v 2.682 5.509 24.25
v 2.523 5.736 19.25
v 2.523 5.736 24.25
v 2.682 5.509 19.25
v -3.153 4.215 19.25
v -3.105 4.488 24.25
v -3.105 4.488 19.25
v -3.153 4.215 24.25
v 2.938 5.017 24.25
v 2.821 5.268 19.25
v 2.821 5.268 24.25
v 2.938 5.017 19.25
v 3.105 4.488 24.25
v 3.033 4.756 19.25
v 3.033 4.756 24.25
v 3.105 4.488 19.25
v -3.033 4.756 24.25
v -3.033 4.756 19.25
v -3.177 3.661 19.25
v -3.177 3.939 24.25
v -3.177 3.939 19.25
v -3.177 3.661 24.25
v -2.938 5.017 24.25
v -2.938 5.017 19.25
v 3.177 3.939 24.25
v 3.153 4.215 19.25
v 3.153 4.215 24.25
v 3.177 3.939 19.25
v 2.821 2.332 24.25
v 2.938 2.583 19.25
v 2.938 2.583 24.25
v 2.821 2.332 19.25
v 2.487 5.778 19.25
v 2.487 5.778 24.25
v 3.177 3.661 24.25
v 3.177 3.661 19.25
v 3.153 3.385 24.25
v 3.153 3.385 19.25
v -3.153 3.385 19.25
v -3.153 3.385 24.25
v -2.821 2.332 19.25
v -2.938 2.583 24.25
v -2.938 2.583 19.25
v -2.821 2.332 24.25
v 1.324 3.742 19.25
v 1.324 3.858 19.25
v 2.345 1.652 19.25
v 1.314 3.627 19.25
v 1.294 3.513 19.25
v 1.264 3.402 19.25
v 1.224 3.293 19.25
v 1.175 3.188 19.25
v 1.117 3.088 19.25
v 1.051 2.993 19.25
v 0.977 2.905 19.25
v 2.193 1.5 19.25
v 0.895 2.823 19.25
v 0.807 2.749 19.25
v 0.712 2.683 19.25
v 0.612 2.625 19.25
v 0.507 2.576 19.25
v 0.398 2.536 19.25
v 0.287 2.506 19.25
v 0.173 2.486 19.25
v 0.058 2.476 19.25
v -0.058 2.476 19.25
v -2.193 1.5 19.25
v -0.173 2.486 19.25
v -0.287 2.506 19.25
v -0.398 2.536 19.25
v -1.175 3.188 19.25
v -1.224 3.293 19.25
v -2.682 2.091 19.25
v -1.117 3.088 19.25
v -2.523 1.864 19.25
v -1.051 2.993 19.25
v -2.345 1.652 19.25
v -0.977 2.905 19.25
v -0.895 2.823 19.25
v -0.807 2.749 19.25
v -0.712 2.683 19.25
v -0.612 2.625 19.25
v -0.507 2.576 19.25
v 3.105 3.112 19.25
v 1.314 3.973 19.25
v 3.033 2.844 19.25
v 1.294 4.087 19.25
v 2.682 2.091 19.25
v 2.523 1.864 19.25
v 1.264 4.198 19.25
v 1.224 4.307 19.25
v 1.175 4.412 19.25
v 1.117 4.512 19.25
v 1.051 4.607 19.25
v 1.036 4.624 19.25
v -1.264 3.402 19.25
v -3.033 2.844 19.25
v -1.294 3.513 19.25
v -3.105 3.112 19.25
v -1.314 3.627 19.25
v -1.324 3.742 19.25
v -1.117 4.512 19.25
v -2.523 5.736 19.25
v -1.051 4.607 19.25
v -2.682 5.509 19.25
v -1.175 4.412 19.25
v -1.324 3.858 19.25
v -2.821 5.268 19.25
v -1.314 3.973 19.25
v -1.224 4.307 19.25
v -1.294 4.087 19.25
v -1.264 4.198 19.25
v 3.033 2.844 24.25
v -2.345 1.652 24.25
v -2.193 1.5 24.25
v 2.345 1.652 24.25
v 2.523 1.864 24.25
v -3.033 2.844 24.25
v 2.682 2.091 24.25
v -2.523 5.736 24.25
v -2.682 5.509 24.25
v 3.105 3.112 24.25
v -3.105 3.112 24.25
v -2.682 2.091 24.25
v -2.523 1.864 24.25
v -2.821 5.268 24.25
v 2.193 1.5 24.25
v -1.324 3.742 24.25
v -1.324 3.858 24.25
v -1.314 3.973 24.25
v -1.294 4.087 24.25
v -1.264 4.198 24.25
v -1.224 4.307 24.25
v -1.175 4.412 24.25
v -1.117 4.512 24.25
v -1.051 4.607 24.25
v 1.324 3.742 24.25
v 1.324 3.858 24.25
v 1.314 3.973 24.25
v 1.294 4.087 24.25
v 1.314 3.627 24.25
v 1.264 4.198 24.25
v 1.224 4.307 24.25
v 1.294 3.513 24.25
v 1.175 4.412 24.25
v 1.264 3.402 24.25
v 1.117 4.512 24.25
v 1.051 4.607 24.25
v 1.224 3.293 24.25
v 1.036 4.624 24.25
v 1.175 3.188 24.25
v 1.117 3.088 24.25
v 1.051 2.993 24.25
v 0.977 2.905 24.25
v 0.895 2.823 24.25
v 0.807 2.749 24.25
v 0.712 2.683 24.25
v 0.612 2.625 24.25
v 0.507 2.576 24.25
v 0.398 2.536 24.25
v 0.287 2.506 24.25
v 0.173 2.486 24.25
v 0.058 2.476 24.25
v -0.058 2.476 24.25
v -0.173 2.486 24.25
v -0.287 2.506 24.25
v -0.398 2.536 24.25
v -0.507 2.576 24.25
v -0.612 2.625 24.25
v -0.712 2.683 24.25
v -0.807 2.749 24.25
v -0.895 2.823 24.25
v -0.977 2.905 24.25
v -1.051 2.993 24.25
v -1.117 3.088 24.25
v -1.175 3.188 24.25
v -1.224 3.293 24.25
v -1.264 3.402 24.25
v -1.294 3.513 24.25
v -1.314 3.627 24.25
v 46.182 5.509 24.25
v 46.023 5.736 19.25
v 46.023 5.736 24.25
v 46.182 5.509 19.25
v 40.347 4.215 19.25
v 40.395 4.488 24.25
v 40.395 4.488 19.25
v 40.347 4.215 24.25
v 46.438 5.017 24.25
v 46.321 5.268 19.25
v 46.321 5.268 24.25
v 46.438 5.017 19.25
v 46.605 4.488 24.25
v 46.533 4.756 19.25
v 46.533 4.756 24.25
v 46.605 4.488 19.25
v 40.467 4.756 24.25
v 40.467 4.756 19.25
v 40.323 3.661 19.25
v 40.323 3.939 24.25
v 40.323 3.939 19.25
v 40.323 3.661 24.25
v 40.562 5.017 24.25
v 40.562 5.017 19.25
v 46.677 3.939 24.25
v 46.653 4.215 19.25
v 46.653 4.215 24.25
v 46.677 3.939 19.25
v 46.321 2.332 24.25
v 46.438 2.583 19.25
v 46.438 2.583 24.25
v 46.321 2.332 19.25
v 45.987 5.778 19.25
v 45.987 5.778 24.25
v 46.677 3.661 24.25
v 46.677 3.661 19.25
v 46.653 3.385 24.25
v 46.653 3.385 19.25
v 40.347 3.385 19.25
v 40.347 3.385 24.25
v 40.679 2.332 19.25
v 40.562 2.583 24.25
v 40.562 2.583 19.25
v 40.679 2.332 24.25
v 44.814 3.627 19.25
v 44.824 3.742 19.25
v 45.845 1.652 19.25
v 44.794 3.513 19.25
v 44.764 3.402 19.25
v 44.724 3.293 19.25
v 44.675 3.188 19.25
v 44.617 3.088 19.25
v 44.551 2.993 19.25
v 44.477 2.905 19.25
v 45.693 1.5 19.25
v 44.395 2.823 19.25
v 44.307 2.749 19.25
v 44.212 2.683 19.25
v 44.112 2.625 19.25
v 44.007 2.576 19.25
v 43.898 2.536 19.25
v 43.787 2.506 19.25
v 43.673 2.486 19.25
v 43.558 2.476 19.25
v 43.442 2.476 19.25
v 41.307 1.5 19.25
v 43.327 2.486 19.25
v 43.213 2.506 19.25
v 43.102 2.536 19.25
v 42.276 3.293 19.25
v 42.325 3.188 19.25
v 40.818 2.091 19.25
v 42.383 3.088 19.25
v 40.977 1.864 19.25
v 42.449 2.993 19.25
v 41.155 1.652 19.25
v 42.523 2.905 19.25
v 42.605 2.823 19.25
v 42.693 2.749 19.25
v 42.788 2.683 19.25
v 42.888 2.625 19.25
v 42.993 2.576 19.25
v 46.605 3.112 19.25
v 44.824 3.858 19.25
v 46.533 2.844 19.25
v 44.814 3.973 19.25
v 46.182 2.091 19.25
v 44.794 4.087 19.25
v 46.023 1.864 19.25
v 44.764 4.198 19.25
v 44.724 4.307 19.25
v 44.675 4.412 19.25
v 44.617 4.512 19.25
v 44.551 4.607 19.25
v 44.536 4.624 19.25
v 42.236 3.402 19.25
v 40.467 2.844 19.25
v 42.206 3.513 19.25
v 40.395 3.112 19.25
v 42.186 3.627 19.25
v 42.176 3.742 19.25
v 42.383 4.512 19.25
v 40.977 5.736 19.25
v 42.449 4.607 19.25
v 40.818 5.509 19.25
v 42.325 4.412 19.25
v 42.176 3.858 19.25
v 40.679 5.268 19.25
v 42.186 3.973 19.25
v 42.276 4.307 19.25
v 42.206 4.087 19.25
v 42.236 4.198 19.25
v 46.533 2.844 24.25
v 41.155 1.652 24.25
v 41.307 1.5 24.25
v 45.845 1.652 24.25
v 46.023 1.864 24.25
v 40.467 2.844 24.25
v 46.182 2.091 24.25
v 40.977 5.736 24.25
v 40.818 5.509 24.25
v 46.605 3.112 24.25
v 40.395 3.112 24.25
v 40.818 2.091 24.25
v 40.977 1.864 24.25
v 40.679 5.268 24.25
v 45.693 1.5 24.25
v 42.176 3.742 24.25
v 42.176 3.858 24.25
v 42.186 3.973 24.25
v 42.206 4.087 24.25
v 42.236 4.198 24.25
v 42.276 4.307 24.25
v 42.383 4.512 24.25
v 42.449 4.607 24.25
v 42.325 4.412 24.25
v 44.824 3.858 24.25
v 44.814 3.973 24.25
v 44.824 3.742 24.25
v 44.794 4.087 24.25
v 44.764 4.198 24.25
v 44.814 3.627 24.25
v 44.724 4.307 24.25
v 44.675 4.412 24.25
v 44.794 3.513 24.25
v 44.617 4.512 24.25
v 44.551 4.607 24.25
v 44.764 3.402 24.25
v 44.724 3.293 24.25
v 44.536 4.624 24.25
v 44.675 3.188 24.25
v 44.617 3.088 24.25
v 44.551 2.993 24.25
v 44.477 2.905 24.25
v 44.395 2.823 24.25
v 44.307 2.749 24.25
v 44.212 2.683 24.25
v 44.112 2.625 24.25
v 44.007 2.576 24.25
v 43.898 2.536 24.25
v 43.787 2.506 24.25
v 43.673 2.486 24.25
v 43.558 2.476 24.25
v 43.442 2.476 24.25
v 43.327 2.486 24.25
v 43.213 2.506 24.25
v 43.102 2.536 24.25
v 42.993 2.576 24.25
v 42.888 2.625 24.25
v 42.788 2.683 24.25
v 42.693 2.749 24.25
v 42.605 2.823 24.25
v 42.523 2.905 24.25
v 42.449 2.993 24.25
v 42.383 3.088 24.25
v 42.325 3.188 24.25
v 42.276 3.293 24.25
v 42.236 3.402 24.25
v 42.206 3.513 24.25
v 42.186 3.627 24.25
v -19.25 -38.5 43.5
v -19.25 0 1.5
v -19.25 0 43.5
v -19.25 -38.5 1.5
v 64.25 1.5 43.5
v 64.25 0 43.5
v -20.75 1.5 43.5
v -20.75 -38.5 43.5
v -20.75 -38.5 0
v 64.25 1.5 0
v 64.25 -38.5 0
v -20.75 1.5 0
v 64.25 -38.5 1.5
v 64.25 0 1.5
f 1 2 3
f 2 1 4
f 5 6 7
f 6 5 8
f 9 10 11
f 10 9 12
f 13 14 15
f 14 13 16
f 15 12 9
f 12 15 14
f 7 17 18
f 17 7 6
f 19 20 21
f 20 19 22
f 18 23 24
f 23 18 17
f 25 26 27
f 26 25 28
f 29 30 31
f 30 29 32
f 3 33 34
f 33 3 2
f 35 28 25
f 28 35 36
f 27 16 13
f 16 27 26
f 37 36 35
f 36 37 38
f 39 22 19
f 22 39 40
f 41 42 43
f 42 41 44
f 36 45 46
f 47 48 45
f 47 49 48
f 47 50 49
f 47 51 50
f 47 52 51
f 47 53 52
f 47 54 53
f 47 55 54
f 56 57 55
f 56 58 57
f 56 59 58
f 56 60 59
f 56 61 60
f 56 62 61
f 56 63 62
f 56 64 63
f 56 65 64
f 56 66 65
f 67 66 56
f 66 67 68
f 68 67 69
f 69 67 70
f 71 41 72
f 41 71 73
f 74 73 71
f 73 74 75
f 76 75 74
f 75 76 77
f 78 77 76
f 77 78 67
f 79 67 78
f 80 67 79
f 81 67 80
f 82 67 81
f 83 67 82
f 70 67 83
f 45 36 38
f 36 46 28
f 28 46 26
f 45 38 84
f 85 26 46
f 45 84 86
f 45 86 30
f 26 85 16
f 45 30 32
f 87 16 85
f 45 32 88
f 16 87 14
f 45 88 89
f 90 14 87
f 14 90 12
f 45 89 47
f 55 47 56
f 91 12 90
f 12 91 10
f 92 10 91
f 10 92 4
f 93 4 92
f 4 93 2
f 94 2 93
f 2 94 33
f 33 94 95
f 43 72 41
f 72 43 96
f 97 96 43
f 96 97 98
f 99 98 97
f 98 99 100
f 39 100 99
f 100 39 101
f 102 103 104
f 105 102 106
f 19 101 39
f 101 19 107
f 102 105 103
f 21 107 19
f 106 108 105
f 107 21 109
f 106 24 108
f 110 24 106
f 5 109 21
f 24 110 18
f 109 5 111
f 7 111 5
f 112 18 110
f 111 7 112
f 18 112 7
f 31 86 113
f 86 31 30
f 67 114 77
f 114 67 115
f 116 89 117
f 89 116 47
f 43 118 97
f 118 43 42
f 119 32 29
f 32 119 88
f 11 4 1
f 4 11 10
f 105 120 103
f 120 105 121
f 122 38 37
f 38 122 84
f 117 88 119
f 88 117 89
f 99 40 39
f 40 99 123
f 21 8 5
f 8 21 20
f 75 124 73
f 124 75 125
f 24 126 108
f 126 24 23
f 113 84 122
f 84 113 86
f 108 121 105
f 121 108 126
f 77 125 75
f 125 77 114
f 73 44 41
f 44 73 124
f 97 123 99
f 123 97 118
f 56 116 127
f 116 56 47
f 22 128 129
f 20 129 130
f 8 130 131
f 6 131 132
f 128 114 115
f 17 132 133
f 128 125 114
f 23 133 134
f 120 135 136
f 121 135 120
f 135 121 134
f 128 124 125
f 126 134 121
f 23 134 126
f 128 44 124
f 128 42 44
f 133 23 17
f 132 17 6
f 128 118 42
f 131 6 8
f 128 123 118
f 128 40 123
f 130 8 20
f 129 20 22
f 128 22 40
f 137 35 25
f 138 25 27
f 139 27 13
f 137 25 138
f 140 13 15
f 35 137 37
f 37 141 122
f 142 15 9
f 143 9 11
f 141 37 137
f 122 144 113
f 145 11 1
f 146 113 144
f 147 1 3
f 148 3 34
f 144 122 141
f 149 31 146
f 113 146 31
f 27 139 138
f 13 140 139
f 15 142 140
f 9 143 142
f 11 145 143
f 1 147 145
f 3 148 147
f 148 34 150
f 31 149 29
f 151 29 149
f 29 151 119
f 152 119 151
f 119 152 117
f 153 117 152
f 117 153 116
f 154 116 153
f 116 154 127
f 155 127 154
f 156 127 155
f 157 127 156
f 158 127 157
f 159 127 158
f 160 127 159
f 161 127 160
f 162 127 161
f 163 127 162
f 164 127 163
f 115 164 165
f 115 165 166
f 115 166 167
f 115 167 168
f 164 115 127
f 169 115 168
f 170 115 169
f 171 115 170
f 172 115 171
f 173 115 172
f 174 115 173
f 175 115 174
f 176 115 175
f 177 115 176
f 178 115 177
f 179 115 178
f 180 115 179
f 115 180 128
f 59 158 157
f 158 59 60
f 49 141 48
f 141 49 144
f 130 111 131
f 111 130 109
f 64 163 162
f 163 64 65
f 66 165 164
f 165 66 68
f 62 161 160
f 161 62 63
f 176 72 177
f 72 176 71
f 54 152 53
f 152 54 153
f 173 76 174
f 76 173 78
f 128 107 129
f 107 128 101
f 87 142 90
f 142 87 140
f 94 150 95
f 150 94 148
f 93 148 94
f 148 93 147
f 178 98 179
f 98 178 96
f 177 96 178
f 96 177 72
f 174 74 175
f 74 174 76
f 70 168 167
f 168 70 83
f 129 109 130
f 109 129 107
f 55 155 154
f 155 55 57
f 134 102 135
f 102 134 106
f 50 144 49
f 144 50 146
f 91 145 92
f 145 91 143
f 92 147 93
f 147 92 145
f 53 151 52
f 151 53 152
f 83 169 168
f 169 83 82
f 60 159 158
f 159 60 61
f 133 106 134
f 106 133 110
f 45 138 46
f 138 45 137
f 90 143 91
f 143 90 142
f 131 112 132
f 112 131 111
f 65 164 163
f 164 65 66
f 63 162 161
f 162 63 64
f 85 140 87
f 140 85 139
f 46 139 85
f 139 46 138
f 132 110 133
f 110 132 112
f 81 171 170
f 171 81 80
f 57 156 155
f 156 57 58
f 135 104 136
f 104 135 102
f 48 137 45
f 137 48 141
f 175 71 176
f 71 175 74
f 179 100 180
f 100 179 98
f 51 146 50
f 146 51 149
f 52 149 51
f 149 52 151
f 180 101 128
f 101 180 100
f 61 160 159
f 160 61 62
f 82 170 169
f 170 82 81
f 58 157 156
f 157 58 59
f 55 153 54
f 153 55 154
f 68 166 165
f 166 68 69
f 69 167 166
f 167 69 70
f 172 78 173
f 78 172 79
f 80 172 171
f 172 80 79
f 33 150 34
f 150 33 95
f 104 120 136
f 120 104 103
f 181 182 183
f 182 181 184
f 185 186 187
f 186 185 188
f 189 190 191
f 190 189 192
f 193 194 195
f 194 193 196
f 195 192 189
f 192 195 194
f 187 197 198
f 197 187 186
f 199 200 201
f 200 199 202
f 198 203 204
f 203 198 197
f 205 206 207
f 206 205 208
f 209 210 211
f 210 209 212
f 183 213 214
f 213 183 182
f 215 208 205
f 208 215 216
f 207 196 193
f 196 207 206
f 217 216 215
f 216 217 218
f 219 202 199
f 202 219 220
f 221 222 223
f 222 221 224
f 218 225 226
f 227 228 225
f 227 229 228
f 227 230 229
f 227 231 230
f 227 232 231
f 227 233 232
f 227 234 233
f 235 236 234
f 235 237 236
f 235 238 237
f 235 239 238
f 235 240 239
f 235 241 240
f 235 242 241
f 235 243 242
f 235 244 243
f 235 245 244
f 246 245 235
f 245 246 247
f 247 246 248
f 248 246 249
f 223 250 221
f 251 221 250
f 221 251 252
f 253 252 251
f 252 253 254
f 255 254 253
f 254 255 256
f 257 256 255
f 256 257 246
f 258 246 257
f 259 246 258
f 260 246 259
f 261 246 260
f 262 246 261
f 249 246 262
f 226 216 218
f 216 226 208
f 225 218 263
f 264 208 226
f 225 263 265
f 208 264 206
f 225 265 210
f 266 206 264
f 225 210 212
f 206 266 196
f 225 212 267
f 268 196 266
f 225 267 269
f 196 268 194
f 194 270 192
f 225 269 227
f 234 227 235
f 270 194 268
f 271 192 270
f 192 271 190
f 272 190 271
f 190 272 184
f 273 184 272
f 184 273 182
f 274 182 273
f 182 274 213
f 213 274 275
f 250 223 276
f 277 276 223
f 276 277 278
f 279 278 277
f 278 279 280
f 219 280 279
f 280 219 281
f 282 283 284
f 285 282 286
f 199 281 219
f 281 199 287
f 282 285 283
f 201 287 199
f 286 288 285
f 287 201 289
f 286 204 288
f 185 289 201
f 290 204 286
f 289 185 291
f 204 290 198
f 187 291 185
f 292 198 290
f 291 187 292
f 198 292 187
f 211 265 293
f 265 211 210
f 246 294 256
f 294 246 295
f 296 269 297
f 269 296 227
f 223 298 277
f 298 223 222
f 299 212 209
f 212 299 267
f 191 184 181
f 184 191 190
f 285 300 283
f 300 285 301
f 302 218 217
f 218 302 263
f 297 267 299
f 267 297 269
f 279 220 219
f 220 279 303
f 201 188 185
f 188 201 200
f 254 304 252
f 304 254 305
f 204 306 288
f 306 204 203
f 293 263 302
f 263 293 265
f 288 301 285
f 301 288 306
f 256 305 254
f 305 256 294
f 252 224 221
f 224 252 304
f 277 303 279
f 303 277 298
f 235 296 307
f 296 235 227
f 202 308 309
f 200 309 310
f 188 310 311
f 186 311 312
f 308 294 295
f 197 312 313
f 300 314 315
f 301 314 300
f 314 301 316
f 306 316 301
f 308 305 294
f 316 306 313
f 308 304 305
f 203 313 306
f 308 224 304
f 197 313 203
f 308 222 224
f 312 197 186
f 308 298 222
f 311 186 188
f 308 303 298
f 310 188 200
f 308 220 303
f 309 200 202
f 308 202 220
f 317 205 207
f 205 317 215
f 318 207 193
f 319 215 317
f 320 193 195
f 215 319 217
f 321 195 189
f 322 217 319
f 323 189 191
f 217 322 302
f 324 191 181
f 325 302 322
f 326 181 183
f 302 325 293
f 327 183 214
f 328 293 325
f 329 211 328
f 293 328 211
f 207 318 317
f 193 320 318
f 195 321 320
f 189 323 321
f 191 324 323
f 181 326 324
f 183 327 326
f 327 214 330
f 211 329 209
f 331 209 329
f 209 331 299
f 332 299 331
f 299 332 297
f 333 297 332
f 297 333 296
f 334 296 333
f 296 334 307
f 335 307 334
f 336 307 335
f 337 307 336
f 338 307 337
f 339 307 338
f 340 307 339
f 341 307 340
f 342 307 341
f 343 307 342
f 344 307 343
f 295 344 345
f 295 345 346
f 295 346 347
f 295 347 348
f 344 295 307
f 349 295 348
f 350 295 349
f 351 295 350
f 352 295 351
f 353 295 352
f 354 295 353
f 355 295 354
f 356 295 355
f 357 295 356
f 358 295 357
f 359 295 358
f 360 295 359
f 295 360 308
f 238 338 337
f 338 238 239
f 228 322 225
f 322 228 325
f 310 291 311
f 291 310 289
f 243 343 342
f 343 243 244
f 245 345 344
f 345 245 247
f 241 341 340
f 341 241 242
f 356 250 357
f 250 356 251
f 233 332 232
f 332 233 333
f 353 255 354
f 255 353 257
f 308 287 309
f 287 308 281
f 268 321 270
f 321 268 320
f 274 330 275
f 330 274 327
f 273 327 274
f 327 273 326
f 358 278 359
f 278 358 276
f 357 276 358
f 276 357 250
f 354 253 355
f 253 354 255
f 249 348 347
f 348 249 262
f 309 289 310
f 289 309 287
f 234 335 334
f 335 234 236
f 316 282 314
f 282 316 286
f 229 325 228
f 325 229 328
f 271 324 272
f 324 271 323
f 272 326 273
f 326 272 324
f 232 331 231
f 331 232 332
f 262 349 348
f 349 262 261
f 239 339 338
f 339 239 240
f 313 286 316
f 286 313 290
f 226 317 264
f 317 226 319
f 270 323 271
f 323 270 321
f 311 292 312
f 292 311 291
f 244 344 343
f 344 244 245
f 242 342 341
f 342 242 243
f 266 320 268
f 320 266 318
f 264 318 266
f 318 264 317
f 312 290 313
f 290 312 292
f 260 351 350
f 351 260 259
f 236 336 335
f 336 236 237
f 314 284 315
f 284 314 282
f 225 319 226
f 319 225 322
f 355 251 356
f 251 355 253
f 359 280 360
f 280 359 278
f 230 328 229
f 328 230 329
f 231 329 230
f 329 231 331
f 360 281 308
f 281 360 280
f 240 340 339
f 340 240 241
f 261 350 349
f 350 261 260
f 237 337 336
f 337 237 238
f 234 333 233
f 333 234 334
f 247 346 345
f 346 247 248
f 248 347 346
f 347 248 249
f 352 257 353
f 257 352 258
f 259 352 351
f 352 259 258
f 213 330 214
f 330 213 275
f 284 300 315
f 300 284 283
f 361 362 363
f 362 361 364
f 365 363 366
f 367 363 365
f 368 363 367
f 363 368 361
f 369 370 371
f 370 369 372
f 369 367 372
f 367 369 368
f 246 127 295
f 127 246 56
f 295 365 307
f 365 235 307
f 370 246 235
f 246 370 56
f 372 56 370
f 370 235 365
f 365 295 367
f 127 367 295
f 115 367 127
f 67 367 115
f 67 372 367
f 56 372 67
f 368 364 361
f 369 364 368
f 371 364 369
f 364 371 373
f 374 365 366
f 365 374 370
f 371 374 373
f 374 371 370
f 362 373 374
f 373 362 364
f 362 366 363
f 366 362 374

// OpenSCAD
echo(version=version());
/*[Hidden]*/
$fs = 0.1;
$fa = 5;

/*[Model]*/
//Wall height in mm (not used in middle-part)
wall_height = 40; 

//Diameter of the wires in mm
wire_thickness = 2.5;

//Distance between two Y-direction wires (back and forth) in mm
wire_yspacing = 46;
//Distance between two X-direction wires (side to side) in mm
wire_xspacing = 46;

trad_ydistance = wire_yspacing-wire_thickness;
trad_xdistance = wire_xspacing-wire_thickness;

floor_length = (trad_ydistance*2)-2;
floor_start = (trad_ydistance/2)-1;

thread_thickness_cut = (wire_thickness+0.15)/2;
thread_cut_part = thread_thickness_cut*2.4;

part = "c_right";// [top_bottom:Top and Bottom Part,side:Side-part,middle:Middle-part without walls,c_right:Top Right and Lower Left part,c_left:Top Left and Lower Right part]

module pie_slice(r=3.0,a=30){
    $fn = 64;
    linear_extrude(height=5){
        intersection(){
            circle(r=r);
            square(r);
            rotate(a-90) square(r);
        }
    }
}

translate([0,3.8,((trad_xdistance/2)-2.5)]){
    rotate(52.5) difference(){
        difference(){
            cylinder(h=5, r=thread_cut_part,center=false);
            cylinder(h=5, r=thread_thickness_cut,center=false);
        }
        union(){
            rotate(-14) pie_slice(r=thread_cut_part+0.1,a=16);
            pie_slice(r=thread_cut_part+0.1,a=90);
        }
    }
}
translate([trad_ydistance,3.8,((trad_xdistance/2)-2.5)]){
    rotate(52.5) difference(){
        difference(){
            cylinder(h=5, r=thread_cut_part,center=false);
            cylinder(h=5, r=thread_thickness_cut,center=false);
        }
        union(){
            rotate(-14) pie_slice(r=thread_cut_part+0.1,a=16);
            pie_slice(r=thread_cut_part+0.1,a=90);
        }
    }
}
translate([-floor_start,0,0]){
    cube(size=[floor_length,1.5,trad_xdistance],center=false);
}

if(part == "top_bottom"){
    translate([-floor_start,-wall_height+1.5,0]){
        cube(size=[floor_length,wall_height,1.5],center=false);
    }
}
else if(part == "side"){
    translate([floor_start+trad_ydistance-1.5,-wall_height+1.5,0]){
        cube(size=[1.5,wall_height,trad_ydistance],center=false);
    }
}
else if(part == "c_right"){
    translate([-floor_start,-wall_height+1.5,0]){
        cube(size=[1.5,wall_height,trad_xdistance],center=false);
    }
    translate([-floor_start,-wall_height+1.5,0]){
        cube(size=[floor_length,wall_height,1.5],center=false);
    }
}
else if(part == "c_left"){
    translate([floor_start+trad_ydistance-1.5,-wall_height+1.5,0]){
        cube(size=[1.5,wall_height,trad_xdistance],center=false);
    }
    translate([-floor_start,-wall_height+1.5,0]){
        cube(size=[floor_length,wall_height,1.5],center=false);
    }
}
